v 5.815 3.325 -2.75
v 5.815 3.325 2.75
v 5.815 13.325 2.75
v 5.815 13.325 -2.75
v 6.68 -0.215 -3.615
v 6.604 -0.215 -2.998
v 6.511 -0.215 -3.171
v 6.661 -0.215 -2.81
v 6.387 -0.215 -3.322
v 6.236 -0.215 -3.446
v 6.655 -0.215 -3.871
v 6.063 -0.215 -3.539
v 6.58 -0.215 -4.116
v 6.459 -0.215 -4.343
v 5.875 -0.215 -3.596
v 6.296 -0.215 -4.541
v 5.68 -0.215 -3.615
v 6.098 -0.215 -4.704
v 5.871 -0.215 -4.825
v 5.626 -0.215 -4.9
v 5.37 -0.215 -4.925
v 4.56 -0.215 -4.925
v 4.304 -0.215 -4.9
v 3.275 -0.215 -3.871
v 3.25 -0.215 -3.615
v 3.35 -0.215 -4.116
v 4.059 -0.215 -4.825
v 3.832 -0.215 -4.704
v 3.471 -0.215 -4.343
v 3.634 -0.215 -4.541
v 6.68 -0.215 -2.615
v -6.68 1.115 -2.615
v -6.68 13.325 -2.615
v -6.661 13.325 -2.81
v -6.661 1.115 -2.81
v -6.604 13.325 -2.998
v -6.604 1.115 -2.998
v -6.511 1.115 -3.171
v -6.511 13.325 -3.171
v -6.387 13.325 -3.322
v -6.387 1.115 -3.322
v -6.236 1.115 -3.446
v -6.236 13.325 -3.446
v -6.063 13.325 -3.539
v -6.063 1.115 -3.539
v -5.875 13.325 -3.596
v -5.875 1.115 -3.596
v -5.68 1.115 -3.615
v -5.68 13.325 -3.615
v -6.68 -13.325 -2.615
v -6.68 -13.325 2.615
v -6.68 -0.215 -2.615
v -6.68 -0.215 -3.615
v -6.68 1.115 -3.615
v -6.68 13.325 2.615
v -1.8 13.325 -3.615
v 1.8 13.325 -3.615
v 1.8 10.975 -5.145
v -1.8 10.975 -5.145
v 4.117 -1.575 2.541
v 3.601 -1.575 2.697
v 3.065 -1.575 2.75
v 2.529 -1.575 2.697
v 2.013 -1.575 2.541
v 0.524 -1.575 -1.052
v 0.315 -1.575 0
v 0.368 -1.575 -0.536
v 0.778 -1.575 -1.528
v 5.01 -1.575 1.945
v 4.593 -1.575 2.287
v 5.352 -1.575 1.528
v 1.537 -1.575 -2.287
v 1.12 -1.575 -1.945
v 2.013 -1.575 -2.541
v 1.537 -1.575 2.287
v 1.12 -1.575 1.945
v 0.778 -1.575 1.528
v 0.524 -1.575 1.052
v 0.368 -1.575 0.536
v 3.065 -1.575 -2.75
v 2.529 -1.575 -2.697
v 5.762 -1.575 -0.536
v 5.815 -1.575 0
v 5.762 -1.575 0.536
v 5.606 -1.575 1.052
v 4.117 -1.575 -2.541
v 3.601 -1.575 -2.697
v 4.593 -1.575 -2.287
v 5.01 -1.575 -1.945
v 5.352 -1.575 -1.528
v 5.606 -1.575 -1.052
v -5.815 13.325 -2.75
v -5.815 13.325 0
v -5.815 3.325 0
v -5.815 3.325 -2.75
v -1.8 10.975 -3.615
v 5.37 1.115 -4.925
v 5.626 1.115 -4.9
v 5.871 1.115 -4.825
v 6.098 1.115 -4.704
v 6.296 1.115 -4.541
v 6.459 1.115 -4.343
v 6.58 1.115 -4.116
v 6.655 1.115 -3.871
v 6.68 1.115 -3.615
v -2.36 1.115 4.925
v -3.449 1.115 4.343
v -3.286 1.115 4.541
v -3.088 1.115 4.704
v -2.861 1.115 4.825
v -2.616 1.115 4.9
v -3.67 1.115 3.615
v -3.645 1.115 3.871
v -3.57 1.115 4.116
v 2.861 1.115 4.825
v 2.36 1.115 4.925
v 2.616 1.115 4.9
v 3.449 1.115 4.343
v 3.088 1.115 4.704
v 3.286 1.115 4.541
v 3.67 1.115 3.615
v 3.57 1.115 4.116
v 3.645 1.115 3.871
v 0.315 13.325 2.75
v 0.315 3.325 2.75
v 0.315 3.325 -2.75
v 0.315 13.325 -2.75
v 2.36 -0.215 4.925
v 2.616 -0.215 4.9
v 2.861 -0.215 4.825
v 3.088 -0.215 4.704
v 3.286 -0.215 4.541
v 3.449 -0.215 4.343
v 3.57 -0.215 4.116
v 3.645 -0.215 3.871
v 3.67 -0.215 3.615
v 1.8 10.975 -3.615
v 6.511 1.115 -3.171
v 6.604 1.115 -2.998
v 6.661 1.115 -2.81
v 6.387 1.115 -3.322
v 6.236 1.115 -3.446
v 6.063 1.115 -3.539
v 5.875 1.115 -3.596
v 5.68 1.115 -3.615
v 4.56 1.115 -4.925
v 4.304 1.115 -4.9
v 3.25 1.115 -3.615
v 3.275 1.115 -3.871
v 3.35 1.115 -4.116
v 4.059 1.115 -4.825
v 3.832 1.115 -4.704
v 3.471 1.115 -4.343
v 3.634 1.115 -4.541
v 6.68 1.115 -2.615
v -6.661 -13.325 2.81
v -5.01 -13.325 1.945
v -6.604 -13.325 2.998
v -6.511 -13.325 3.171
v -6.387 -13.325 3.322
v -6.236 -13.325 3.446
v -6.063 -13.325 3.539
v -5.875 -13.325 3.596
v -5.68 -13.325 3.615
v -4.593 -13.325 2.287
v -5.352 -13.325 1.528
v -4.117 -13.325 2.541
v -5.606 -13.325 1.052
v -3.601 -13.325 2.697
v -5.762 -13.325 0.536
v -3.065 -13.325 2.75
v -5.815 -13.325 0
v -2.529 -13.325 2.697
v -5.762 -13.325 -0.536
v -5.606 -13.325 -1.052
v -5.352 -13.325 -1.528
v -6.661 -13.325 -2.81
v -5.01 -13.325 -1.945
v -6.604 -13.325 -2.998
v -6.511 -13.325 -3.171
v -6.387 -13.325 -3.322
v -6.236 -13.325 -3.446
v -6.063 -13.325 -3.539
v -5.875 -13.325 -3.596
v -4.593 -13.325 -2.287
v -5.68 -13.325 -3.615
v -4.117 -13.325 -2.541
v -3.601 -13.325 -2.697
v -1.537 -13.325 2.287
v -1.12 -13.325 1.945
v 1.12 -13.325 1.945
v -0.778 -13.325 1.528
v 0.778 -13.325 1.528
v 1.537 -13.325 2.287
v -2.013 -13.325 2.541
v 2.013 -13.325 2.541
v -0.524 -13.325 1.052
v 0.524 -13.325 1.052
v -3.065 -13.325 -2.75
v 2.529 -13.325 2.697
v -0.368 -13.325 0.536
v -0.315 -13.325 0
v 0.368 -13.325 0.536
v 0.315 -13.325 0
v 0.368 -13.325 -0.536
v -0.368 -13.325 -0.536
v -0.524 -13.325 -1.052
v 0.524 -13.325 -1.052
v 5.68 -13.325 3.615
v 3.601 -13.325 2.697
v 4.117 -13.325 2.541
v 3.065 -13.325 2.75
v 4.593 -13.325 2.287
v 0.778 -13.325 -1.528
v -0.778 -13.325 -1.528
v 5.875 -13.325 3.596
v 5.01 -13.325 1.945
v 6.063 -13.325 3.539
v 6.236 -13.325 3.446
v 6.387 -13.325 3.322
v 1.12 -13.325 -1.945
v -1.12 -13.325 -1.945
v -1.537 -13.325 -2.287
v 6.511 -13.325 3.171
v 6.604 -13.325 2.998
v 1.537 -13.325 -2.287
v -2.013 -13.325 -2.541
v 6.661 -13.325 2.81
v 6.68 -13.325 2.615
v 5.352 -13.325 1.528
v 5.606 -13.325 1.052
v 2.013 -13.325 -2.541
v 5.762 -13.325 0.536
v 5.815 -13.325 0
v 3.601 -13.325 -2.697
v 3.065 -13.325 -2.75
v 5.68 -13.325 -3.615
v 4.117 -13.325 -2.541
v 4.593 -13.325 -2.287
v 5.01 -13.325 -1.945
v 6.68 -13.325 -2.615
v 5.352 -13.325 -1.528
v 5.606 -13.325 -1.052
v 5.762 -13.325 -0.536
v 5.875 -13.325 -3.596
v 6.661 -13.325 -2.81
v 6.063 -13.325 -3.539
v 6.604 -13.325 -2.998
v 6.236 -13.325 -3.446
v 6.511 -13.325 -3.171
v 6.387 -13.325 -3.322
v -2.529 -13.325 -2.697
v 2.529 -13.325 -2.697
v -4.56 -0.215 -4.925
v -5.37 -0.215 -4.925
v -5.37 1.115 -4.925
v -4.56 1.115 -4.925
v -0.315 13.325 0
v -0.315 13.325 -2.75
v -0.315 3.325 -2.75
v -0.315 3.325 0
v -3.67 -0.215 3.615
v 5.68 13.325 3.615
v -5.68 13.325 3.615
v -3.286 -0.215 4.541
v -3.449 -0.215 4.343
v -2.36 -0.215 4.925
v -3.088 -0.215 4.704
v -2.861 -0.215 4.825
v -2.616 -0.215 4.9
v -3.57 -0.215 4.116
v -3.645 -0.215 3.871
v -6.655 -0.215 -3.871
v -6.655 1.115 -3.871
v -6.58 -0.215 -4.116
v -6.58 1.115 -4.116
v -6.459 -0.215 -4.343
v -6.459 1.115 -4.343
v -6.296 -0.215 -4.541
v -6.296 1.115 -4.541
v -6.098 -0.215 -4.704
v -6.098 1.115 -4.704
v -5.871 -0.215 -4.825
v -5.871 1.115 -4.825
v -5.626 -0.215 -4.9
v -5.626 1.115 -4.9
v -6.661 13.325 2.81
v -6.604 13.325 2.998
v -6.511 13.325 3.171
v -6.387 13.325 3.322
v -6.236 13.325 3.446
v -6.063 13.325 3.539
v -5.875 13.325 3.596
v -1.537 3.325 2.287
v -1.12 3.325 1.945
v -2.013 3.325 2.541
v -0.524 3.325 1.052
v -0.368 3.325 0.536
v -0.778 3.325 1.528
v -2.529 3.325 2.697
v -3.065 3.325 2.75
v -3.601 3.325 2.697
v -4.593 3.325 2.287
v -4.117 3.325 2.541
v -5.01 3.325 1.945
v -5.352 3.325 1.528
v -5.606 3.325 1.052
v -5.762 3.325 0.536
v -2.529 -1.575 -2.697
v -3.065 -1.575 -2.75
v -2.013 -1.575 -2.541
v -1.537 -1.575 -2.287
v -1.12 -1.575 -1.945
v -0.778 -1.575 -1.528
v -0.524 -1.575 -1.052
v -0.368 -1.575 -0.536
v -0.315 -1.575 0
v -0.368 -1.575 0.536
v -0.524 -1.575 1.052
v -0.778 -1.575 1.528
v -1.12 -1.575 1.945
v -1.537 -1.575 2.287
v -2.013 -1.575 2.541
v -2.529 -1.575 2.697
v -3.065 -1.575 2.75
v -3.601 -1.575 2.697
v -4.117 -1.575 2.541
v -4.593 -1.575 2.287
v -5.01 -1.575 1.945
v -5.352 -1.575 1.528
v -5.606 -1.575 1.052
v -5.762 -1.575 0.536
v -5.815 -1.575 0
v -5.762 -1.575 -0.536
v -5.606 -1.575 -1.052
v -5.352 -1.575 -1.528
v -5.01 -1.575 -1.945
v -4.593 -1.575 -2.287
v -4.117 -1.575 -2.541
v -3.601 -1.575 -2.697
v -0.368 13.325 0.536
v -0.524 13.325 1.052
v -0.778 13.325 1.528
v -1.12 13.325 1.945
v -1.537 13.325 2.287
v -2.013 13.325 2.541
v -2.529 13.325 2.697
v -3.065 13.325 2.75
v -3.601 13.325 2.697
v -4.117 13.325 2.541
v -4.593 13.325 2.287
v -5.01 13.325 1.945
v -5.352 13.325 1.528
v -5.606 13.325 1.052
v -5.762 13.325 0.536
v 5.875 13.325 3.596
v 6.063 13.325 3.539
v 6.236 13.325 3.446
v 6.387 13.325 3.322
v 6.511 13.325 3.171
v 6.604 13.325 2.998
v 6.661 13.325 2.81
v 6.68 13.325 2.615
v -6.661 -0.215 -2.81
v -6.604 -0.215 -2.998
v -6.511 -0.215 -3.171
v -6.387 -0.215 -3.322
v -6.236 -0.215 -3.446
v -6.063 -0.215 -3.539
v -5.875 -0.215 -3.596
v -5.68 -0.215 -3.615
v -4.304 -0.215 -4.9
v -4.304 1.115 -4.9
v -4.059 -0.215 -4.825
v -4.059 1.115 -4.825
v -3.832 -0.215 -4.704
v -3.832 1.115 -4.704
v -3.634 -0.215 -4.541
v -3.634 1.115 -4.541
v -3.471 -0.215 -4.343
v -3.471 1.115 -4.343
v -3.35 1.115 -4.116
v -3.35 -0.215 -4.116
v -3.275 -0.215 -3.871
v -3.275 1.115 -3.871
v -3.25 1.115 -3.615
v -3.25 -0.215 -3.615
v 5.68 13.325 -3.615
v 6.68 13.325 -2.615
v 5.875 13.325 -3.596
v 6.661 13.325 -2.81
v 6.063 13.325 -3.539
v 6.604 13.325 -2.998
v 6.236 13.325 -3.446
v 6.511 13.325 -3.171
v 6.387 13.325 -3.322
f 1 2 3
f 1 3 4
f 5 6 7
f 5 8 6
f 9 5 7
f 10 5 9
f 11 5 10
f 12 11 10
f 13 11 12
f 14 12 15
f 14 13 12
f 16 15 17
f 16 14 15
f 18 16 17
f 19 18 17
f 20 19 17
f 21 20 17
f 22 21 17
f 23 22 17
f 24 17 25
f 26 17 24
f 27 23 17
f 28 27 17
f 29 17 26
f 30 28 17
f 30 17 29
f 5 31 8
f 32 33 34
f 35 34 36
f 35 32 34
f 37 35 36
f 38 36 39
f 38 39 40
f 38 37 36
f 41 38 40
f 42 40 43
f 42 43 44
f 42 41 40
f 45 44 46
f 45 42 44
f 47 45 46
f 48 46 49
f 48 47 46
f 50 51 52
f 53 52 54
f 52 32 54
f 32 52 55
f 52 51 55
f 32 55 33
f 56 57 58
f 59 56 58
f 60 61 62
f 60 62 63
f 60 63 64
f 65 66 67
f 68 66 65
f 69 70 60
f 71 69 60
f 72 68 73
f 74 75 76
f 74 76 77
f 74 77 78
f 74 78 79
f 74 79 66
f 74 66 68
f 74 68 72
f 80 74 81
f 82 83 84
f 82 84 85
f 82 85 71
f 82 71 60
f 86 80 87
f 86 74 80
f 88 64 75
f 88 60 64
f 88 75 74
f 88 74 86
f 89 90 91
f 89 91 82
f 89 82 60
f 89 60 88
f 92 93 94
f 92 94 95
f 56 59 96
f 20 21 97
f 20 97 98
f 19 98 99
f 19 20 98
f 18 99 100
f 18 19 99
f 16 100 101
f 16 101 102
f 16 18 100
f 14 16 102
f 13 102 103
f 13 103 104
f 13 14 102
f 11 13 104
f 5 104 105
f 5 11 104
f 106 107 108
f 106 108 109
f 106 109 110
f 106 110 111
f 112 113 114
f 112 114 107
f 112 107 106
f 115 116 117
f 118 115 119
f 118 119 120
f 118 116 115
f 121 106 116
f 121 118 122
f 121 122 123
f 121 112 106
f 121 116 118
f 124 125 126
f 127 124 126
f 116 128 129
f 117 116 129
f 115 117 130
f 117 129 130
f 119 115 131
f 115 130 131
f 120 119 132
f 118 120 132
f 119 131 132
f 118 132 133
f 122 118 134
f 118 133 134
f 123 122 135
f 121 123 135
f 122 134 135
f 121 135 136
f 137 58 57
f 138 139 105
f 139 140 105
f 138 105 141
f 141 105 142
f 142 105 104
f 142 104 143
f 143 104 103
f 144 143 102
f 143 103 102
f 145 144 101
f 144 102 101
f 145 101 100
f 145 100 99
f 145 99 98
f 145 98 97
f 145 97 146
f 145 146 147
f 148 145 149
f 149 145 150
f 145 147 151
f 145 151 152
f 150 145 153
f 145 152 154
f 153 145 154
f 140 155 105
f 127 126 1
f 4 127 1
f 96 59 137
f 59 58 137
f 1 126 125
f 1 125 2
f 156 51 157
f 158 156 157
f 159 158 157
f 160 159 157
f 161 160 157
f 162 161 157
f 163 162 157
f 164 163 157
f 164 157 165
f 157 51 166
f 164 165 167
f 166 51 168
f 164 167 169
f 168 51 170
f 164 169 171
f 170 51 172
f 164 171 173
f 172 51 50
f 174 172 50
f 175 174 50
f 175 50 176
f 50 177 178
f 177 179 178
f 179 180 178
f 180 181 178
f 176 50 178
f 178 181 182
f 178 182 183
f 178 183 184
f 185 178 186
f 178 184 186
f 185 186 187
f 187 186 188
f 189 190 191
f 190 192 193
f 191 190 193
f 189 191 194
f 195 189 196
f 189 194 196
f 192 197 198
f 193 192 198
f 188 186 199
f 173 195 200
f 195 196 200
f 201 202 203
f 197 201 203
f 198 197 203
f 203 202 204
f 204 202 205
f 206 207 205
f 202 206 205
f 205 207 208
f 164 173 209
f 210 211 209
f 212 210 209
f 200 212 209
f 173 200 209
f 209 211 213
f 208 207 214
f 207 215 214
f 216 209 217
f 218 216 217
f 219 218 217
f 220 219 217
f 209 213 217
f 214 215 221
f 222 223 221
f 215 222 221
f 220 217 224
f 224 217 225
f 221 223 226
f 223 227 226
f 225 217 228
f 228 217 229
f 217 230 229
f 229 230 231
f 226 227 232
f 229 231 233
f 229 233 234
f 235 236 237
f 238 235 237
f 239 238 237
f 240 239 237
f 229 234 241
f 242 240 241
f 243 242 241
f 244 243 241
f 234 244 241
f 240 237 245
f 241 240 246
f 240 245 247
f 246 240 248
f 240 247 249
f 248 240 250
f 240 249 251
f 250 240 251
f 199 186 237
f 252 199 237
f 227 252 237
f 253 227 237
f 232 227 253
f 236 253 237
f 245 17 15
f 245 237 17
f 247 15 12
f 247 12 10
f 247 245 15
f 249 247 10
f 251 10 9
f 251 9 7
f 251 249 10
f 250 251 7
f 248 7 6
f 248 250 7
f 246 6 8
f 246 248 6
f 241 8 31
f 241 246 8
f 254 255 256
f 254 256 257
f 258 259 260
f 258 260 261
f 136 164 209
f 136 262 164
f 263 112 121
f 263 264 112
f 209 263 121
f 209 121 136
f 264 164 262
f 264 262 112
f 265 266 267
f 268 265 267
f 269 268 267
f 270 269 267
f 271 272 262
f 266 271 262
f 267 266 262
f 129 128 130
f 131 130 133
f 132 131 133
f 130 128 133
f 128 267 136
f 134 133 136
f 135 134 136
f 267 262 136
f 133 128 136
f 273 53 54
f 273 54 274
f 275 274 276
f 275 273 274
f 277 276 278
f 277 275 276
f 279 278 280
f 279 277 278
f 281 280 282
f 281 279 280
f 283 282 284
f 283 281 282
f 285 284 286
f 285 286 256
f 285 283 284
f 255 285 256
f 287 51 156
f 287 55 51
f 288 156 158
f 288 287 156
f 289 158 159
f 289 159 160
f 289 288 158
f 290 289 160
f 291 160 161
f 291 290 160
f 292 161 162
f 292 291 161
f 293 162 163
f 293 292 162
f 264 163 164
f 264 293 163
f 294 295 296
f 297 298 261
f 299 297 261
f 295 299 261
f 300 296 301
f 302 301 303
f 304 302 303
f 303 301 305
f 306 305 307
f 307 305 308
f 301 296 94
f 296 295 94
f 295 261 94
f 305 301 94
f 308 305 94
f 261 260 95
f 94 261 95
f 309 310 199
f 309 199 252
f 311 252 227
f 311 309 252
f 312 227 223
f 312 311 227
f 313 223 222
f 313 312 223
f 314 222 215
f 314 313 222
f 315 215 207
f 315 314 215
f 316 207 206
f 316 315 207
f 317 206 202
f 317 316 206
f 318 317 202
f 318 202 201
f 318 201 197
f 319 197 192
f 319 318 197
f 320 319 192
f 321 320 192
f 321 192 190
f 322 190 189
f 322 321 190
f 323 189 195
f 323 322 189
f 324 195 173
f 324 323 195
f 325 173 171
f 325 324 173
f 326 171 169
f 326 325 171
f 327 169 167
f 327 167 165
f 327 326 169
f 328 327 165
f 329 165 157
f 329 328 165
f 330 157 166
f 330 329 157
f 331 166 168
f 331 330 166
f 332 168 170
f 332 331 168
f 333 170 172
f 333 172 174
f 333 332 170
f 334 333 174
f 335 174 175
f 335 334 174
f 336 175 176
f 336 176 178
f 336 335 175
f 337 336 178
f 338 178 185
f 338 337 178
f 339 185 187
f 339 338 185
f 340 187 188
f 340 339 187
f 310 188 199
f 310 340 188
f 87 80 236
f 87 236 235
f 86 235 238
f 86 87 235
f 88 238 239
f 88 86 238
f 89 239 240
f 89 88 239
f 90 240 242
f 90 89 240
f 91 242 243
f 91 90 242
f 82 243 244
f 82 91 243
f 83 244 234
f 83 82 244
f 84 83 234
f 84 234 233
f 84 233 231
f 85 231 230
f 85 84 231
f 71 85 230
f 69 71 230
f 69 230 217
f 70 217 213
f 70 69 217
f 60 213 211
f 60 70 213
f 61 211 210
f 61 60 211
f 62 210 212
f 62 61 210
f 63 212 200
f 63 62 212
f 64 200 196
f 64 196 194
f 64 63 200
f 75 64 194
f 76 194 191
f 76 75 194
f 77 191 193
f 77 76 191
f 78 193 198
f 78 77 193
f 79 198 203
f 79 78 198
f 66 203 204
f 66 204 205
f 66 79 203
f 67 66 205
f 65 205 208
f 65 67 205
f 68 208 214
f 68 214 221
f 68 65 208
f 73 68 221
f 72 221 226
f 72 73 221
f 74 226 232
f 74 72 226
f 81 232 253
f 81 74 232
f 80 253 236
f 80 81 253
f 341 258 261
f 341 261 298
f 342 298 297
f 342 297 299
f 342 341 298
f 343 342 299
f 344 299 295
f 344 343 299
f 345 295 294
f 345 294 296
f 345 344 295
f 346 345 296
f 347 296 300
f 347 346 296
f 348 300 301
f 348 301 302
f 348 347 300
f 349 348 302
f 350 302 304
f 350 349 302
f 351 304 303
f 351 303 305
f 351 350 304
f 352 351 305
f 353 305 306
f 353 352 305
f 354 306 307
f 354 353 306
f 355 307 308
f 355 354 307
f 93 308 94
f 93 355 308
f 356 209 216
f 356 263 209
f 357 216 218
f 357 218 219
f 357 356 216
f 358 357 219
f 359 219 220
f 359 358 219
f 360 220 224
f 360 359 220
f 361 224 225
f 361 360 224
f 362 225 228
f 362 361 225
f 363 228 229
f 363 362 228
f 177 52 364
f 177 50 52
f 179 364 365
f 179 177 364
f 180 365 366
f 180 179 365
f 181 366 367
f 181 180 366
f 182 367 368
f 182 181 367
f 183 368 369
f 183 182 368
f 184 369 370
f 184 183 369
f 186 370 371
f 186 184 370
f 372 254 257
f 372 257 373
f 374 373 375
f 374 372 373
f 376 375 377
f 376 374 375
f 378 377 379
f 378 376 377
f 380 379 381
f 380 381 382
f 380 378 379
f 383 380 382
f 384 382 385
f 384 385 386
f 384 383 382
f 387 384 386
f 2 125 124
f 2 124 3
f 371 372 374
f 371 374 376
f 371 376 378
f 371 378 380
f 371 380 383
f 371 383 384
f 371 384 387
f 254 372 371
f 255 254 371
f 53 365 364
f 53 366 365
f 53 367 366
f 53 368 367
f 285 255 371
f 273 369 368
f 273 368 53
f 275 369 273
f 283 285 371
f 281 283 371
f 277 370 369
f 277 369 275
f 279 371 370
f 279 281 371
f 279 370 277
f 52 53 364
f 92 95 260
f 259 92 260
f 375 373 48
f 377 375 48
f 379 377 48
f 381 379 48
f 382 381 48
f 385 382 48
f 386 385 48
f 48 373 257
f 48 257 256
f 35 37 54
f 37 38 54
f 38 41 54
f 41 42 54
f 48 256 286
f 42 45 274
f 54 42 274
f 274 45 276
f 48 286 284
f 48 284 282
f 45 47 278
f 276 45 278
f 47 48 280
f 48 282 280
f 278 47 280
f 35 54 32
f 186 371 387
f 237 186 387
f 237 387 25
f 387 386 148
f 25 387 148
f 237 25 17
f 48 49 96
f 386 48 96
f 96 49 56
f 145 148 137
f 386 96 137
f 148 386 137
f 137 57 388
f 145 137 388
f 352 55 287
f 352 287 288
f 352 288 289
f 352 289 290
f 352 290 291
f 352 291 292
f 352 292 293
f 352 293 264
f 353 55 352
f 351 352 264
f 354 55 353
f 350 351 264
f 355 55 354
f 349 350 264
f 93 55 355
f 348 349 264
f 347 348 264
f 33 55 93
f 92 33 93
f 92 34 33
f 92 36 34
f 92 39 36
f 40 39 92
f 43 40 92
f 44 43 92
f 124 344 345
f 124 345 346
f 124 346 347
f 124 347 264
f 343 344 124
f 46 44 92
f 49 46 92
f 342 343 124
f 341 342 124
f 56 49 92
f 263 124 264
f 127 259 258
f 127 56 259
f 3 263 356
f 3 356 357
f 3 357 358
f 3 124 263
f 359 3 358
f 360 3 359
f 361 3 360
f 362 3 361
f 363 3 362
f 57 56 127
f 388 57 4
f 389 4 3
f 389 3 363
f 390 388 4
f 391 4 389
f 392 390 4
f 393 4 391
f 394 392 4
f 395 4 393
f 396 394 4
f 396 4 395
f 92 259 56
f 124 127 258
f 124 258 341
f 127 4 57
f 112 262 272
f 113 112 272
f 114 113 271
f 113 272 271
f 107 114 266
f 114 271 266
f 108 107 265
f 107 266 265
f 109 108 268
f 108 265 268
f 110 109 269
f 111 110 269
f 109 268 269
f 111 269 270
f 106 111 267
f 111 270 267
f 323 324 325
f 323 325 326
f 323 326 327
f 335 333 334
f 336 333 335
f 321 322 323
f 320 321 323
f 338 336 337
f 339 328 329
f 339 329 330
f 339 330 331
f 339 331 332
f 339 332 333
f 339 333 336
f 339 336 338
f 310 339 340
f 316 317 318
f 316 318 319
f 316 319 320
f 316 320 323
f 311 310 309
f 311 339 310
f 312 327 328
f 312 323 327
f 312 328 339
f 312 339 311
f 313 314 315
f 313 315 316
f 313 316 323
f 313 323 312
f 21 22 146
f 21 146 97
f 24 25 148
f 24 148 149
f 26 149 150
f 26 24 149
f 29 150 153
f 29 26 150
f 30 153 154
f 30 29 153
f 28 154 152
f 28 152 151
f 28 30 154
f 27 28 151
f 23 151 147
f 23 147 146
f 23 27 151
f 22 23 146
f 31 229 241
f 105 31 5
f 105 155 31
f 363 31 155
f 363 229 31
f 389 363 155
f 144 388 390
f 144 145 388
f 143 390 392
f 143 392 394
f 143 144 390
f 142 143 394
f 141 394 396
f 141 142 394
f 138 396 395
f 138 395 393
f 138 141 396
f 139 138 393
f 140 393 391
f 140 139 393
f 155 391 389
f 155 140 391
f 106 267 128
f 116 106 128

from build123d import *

# Parameters (mm, degrees)
SKETCH1_W           = 13.36
SKETCH1_H           = 7.23
BOSS_EXTRUDE1_DEPTH = 13.325
SKETCH2_W           = 5.5
SKETCH2_H           = 5.5
CUT_EXTRUDE1_DEPTH  = 10
CUT_EXTRUDE2_START  = -11.75
SKETCH3_R           = 2.75
CUT_EXTRUDE2_DEPTH  = 11.75
BOSS_EXTRUDE2_DEPTH = 1.8
BOSS_EXTRUDE3_DEPTH = 1.33
FILLET1_R           = 1


with BuildPart() as part:
    # Sketch1 → Boss-Extrude1 (new, symmetric)
    with BuildSketch(Plane(origin=(0, 0, 0), x_dir=(1, 0, 0), z_dir=(0, 1, 0))):
        Rectangle(SKETCH1_W, SKETCH1_H)
    extrude(amount=BOSS_EXTRUDE1_DEPTH, both=True)

    # Sketch2 → Cut-Extrude1 (cut)
    with BuildSketch(Plane(origin=(0, 13.325, 0), x_dir=(1, 0, 0), z_dir=(0, 1, 0))):
        with BuildLine():
            Line((-5.815, 2.75), (-0.315, 2.75))
            Line((-0.315, 2.75), (-0.315, 0))
            ThreePointArc((-0.315, 0), (-3.065, -2.75), (-5.815, 0))
            Line((-5.815, 0), (-5.815, 2.75))
        make_face()
        with Locations((3.065, 0)):
            Rectangle(SKETCH2_W, SKETCH2_H)
    extrude(amount=-CUT_EXTRUDE1_DEPTH, mode=Mode.SUBTRACT)

    # Sketch3 → Cut-Extrude2 (cut)
    with BuildSketch(Plane.XZ.offset(13.325).offset(CUT_EXTRUDE2_START)):
        with Locations(Location((-3.065, 0, 0), (0, 0, 270))):
            Circle(SKETCH3_R)
        with Locations(Location((3.065, 0, 0), (0, 0, 270))):
            Circle(SKETCH3_R)
    extrude(amount=CUT_EXTRUDE2_DEPTH, mode=Mode.SUBTRACT)

    # Sketch4 → Boss-Extrude2 (add, symmetric)
    with BuildSketch(Plane(origin=(0, 0, 0), x_dir=(0, 0, -1), z_dir=(1, 0, 0))):
        Polygon((3.615, 13.325), (5.145, 10.975), (3.615, 10.975), align=None)
    extrude(amount=BOSS_EXTRUDE2_DEPTH, both=True)

    # Sketch5 → Boss-Extrude3 (add)
    with BuildSketch(Plane(origin=(0, -0.215, 0), x_dir=(1, 0, 0), z_dir=(0, 1, 0))):
        with BuildLine():
            Line((-5.37, 4.925), (-4.56, 4.925))
            ThreePointArc((-4.56, 4.925), (-3.633690117, 4.541309883), (-3.25, 3.615))
            Line((-3.25, 3.615), (-6.68, 3.615))
            ThreePointArc((-6.68, 3.615), (-6.296309883, 4.541309883), (-5.37, 4.925))
        make_face()
        with BuildLine():
            Line((4.56, 4.925), (5.37, 4.925))
            ThreePointArc((5.37, 4.925), (6.296309883, 4.541309883), (6.68, 3.615))
            Line((6.68, 3.615), (3.25, 3.615))
            ThreePointArc((3.25, 3.615), (3.633690117, 4.541309883), (4.56, 4.925))
        make_face()
        with BuildLine():
            Line((-2.36, -4.925), (2.36, -4.925))
            ThreePointArc((2.36, -4.925), (3.286309883, -4.541309883), (3.67, -3.615))
            Line((3.67, -3.615), (-3.67, -3.615))
            ThreePointArc((-3.67, -3.615), (-3.286309883, -4.541309883), (-2.36, -4.925))
        make_face()
    extrude(amount=BOSS_EXTRUDE3_DEPTH)

    # Fillet1
    fillet1_edges = [part.edges().sort_by_distance(p)[0] for p in [
        (-6.68, -6.77, -3.615),
        (6.68, -6.77, -3.615),
        (6.68, 0, 3.615),
        (-6.68, 0, 3.615),
        (-6.68, 7.22, -3.615),
        (6.68, 7.22, -3.615),
    ]]
    fillet(fillet1_edges, radius=FILLET1_R)


solid = part.part
